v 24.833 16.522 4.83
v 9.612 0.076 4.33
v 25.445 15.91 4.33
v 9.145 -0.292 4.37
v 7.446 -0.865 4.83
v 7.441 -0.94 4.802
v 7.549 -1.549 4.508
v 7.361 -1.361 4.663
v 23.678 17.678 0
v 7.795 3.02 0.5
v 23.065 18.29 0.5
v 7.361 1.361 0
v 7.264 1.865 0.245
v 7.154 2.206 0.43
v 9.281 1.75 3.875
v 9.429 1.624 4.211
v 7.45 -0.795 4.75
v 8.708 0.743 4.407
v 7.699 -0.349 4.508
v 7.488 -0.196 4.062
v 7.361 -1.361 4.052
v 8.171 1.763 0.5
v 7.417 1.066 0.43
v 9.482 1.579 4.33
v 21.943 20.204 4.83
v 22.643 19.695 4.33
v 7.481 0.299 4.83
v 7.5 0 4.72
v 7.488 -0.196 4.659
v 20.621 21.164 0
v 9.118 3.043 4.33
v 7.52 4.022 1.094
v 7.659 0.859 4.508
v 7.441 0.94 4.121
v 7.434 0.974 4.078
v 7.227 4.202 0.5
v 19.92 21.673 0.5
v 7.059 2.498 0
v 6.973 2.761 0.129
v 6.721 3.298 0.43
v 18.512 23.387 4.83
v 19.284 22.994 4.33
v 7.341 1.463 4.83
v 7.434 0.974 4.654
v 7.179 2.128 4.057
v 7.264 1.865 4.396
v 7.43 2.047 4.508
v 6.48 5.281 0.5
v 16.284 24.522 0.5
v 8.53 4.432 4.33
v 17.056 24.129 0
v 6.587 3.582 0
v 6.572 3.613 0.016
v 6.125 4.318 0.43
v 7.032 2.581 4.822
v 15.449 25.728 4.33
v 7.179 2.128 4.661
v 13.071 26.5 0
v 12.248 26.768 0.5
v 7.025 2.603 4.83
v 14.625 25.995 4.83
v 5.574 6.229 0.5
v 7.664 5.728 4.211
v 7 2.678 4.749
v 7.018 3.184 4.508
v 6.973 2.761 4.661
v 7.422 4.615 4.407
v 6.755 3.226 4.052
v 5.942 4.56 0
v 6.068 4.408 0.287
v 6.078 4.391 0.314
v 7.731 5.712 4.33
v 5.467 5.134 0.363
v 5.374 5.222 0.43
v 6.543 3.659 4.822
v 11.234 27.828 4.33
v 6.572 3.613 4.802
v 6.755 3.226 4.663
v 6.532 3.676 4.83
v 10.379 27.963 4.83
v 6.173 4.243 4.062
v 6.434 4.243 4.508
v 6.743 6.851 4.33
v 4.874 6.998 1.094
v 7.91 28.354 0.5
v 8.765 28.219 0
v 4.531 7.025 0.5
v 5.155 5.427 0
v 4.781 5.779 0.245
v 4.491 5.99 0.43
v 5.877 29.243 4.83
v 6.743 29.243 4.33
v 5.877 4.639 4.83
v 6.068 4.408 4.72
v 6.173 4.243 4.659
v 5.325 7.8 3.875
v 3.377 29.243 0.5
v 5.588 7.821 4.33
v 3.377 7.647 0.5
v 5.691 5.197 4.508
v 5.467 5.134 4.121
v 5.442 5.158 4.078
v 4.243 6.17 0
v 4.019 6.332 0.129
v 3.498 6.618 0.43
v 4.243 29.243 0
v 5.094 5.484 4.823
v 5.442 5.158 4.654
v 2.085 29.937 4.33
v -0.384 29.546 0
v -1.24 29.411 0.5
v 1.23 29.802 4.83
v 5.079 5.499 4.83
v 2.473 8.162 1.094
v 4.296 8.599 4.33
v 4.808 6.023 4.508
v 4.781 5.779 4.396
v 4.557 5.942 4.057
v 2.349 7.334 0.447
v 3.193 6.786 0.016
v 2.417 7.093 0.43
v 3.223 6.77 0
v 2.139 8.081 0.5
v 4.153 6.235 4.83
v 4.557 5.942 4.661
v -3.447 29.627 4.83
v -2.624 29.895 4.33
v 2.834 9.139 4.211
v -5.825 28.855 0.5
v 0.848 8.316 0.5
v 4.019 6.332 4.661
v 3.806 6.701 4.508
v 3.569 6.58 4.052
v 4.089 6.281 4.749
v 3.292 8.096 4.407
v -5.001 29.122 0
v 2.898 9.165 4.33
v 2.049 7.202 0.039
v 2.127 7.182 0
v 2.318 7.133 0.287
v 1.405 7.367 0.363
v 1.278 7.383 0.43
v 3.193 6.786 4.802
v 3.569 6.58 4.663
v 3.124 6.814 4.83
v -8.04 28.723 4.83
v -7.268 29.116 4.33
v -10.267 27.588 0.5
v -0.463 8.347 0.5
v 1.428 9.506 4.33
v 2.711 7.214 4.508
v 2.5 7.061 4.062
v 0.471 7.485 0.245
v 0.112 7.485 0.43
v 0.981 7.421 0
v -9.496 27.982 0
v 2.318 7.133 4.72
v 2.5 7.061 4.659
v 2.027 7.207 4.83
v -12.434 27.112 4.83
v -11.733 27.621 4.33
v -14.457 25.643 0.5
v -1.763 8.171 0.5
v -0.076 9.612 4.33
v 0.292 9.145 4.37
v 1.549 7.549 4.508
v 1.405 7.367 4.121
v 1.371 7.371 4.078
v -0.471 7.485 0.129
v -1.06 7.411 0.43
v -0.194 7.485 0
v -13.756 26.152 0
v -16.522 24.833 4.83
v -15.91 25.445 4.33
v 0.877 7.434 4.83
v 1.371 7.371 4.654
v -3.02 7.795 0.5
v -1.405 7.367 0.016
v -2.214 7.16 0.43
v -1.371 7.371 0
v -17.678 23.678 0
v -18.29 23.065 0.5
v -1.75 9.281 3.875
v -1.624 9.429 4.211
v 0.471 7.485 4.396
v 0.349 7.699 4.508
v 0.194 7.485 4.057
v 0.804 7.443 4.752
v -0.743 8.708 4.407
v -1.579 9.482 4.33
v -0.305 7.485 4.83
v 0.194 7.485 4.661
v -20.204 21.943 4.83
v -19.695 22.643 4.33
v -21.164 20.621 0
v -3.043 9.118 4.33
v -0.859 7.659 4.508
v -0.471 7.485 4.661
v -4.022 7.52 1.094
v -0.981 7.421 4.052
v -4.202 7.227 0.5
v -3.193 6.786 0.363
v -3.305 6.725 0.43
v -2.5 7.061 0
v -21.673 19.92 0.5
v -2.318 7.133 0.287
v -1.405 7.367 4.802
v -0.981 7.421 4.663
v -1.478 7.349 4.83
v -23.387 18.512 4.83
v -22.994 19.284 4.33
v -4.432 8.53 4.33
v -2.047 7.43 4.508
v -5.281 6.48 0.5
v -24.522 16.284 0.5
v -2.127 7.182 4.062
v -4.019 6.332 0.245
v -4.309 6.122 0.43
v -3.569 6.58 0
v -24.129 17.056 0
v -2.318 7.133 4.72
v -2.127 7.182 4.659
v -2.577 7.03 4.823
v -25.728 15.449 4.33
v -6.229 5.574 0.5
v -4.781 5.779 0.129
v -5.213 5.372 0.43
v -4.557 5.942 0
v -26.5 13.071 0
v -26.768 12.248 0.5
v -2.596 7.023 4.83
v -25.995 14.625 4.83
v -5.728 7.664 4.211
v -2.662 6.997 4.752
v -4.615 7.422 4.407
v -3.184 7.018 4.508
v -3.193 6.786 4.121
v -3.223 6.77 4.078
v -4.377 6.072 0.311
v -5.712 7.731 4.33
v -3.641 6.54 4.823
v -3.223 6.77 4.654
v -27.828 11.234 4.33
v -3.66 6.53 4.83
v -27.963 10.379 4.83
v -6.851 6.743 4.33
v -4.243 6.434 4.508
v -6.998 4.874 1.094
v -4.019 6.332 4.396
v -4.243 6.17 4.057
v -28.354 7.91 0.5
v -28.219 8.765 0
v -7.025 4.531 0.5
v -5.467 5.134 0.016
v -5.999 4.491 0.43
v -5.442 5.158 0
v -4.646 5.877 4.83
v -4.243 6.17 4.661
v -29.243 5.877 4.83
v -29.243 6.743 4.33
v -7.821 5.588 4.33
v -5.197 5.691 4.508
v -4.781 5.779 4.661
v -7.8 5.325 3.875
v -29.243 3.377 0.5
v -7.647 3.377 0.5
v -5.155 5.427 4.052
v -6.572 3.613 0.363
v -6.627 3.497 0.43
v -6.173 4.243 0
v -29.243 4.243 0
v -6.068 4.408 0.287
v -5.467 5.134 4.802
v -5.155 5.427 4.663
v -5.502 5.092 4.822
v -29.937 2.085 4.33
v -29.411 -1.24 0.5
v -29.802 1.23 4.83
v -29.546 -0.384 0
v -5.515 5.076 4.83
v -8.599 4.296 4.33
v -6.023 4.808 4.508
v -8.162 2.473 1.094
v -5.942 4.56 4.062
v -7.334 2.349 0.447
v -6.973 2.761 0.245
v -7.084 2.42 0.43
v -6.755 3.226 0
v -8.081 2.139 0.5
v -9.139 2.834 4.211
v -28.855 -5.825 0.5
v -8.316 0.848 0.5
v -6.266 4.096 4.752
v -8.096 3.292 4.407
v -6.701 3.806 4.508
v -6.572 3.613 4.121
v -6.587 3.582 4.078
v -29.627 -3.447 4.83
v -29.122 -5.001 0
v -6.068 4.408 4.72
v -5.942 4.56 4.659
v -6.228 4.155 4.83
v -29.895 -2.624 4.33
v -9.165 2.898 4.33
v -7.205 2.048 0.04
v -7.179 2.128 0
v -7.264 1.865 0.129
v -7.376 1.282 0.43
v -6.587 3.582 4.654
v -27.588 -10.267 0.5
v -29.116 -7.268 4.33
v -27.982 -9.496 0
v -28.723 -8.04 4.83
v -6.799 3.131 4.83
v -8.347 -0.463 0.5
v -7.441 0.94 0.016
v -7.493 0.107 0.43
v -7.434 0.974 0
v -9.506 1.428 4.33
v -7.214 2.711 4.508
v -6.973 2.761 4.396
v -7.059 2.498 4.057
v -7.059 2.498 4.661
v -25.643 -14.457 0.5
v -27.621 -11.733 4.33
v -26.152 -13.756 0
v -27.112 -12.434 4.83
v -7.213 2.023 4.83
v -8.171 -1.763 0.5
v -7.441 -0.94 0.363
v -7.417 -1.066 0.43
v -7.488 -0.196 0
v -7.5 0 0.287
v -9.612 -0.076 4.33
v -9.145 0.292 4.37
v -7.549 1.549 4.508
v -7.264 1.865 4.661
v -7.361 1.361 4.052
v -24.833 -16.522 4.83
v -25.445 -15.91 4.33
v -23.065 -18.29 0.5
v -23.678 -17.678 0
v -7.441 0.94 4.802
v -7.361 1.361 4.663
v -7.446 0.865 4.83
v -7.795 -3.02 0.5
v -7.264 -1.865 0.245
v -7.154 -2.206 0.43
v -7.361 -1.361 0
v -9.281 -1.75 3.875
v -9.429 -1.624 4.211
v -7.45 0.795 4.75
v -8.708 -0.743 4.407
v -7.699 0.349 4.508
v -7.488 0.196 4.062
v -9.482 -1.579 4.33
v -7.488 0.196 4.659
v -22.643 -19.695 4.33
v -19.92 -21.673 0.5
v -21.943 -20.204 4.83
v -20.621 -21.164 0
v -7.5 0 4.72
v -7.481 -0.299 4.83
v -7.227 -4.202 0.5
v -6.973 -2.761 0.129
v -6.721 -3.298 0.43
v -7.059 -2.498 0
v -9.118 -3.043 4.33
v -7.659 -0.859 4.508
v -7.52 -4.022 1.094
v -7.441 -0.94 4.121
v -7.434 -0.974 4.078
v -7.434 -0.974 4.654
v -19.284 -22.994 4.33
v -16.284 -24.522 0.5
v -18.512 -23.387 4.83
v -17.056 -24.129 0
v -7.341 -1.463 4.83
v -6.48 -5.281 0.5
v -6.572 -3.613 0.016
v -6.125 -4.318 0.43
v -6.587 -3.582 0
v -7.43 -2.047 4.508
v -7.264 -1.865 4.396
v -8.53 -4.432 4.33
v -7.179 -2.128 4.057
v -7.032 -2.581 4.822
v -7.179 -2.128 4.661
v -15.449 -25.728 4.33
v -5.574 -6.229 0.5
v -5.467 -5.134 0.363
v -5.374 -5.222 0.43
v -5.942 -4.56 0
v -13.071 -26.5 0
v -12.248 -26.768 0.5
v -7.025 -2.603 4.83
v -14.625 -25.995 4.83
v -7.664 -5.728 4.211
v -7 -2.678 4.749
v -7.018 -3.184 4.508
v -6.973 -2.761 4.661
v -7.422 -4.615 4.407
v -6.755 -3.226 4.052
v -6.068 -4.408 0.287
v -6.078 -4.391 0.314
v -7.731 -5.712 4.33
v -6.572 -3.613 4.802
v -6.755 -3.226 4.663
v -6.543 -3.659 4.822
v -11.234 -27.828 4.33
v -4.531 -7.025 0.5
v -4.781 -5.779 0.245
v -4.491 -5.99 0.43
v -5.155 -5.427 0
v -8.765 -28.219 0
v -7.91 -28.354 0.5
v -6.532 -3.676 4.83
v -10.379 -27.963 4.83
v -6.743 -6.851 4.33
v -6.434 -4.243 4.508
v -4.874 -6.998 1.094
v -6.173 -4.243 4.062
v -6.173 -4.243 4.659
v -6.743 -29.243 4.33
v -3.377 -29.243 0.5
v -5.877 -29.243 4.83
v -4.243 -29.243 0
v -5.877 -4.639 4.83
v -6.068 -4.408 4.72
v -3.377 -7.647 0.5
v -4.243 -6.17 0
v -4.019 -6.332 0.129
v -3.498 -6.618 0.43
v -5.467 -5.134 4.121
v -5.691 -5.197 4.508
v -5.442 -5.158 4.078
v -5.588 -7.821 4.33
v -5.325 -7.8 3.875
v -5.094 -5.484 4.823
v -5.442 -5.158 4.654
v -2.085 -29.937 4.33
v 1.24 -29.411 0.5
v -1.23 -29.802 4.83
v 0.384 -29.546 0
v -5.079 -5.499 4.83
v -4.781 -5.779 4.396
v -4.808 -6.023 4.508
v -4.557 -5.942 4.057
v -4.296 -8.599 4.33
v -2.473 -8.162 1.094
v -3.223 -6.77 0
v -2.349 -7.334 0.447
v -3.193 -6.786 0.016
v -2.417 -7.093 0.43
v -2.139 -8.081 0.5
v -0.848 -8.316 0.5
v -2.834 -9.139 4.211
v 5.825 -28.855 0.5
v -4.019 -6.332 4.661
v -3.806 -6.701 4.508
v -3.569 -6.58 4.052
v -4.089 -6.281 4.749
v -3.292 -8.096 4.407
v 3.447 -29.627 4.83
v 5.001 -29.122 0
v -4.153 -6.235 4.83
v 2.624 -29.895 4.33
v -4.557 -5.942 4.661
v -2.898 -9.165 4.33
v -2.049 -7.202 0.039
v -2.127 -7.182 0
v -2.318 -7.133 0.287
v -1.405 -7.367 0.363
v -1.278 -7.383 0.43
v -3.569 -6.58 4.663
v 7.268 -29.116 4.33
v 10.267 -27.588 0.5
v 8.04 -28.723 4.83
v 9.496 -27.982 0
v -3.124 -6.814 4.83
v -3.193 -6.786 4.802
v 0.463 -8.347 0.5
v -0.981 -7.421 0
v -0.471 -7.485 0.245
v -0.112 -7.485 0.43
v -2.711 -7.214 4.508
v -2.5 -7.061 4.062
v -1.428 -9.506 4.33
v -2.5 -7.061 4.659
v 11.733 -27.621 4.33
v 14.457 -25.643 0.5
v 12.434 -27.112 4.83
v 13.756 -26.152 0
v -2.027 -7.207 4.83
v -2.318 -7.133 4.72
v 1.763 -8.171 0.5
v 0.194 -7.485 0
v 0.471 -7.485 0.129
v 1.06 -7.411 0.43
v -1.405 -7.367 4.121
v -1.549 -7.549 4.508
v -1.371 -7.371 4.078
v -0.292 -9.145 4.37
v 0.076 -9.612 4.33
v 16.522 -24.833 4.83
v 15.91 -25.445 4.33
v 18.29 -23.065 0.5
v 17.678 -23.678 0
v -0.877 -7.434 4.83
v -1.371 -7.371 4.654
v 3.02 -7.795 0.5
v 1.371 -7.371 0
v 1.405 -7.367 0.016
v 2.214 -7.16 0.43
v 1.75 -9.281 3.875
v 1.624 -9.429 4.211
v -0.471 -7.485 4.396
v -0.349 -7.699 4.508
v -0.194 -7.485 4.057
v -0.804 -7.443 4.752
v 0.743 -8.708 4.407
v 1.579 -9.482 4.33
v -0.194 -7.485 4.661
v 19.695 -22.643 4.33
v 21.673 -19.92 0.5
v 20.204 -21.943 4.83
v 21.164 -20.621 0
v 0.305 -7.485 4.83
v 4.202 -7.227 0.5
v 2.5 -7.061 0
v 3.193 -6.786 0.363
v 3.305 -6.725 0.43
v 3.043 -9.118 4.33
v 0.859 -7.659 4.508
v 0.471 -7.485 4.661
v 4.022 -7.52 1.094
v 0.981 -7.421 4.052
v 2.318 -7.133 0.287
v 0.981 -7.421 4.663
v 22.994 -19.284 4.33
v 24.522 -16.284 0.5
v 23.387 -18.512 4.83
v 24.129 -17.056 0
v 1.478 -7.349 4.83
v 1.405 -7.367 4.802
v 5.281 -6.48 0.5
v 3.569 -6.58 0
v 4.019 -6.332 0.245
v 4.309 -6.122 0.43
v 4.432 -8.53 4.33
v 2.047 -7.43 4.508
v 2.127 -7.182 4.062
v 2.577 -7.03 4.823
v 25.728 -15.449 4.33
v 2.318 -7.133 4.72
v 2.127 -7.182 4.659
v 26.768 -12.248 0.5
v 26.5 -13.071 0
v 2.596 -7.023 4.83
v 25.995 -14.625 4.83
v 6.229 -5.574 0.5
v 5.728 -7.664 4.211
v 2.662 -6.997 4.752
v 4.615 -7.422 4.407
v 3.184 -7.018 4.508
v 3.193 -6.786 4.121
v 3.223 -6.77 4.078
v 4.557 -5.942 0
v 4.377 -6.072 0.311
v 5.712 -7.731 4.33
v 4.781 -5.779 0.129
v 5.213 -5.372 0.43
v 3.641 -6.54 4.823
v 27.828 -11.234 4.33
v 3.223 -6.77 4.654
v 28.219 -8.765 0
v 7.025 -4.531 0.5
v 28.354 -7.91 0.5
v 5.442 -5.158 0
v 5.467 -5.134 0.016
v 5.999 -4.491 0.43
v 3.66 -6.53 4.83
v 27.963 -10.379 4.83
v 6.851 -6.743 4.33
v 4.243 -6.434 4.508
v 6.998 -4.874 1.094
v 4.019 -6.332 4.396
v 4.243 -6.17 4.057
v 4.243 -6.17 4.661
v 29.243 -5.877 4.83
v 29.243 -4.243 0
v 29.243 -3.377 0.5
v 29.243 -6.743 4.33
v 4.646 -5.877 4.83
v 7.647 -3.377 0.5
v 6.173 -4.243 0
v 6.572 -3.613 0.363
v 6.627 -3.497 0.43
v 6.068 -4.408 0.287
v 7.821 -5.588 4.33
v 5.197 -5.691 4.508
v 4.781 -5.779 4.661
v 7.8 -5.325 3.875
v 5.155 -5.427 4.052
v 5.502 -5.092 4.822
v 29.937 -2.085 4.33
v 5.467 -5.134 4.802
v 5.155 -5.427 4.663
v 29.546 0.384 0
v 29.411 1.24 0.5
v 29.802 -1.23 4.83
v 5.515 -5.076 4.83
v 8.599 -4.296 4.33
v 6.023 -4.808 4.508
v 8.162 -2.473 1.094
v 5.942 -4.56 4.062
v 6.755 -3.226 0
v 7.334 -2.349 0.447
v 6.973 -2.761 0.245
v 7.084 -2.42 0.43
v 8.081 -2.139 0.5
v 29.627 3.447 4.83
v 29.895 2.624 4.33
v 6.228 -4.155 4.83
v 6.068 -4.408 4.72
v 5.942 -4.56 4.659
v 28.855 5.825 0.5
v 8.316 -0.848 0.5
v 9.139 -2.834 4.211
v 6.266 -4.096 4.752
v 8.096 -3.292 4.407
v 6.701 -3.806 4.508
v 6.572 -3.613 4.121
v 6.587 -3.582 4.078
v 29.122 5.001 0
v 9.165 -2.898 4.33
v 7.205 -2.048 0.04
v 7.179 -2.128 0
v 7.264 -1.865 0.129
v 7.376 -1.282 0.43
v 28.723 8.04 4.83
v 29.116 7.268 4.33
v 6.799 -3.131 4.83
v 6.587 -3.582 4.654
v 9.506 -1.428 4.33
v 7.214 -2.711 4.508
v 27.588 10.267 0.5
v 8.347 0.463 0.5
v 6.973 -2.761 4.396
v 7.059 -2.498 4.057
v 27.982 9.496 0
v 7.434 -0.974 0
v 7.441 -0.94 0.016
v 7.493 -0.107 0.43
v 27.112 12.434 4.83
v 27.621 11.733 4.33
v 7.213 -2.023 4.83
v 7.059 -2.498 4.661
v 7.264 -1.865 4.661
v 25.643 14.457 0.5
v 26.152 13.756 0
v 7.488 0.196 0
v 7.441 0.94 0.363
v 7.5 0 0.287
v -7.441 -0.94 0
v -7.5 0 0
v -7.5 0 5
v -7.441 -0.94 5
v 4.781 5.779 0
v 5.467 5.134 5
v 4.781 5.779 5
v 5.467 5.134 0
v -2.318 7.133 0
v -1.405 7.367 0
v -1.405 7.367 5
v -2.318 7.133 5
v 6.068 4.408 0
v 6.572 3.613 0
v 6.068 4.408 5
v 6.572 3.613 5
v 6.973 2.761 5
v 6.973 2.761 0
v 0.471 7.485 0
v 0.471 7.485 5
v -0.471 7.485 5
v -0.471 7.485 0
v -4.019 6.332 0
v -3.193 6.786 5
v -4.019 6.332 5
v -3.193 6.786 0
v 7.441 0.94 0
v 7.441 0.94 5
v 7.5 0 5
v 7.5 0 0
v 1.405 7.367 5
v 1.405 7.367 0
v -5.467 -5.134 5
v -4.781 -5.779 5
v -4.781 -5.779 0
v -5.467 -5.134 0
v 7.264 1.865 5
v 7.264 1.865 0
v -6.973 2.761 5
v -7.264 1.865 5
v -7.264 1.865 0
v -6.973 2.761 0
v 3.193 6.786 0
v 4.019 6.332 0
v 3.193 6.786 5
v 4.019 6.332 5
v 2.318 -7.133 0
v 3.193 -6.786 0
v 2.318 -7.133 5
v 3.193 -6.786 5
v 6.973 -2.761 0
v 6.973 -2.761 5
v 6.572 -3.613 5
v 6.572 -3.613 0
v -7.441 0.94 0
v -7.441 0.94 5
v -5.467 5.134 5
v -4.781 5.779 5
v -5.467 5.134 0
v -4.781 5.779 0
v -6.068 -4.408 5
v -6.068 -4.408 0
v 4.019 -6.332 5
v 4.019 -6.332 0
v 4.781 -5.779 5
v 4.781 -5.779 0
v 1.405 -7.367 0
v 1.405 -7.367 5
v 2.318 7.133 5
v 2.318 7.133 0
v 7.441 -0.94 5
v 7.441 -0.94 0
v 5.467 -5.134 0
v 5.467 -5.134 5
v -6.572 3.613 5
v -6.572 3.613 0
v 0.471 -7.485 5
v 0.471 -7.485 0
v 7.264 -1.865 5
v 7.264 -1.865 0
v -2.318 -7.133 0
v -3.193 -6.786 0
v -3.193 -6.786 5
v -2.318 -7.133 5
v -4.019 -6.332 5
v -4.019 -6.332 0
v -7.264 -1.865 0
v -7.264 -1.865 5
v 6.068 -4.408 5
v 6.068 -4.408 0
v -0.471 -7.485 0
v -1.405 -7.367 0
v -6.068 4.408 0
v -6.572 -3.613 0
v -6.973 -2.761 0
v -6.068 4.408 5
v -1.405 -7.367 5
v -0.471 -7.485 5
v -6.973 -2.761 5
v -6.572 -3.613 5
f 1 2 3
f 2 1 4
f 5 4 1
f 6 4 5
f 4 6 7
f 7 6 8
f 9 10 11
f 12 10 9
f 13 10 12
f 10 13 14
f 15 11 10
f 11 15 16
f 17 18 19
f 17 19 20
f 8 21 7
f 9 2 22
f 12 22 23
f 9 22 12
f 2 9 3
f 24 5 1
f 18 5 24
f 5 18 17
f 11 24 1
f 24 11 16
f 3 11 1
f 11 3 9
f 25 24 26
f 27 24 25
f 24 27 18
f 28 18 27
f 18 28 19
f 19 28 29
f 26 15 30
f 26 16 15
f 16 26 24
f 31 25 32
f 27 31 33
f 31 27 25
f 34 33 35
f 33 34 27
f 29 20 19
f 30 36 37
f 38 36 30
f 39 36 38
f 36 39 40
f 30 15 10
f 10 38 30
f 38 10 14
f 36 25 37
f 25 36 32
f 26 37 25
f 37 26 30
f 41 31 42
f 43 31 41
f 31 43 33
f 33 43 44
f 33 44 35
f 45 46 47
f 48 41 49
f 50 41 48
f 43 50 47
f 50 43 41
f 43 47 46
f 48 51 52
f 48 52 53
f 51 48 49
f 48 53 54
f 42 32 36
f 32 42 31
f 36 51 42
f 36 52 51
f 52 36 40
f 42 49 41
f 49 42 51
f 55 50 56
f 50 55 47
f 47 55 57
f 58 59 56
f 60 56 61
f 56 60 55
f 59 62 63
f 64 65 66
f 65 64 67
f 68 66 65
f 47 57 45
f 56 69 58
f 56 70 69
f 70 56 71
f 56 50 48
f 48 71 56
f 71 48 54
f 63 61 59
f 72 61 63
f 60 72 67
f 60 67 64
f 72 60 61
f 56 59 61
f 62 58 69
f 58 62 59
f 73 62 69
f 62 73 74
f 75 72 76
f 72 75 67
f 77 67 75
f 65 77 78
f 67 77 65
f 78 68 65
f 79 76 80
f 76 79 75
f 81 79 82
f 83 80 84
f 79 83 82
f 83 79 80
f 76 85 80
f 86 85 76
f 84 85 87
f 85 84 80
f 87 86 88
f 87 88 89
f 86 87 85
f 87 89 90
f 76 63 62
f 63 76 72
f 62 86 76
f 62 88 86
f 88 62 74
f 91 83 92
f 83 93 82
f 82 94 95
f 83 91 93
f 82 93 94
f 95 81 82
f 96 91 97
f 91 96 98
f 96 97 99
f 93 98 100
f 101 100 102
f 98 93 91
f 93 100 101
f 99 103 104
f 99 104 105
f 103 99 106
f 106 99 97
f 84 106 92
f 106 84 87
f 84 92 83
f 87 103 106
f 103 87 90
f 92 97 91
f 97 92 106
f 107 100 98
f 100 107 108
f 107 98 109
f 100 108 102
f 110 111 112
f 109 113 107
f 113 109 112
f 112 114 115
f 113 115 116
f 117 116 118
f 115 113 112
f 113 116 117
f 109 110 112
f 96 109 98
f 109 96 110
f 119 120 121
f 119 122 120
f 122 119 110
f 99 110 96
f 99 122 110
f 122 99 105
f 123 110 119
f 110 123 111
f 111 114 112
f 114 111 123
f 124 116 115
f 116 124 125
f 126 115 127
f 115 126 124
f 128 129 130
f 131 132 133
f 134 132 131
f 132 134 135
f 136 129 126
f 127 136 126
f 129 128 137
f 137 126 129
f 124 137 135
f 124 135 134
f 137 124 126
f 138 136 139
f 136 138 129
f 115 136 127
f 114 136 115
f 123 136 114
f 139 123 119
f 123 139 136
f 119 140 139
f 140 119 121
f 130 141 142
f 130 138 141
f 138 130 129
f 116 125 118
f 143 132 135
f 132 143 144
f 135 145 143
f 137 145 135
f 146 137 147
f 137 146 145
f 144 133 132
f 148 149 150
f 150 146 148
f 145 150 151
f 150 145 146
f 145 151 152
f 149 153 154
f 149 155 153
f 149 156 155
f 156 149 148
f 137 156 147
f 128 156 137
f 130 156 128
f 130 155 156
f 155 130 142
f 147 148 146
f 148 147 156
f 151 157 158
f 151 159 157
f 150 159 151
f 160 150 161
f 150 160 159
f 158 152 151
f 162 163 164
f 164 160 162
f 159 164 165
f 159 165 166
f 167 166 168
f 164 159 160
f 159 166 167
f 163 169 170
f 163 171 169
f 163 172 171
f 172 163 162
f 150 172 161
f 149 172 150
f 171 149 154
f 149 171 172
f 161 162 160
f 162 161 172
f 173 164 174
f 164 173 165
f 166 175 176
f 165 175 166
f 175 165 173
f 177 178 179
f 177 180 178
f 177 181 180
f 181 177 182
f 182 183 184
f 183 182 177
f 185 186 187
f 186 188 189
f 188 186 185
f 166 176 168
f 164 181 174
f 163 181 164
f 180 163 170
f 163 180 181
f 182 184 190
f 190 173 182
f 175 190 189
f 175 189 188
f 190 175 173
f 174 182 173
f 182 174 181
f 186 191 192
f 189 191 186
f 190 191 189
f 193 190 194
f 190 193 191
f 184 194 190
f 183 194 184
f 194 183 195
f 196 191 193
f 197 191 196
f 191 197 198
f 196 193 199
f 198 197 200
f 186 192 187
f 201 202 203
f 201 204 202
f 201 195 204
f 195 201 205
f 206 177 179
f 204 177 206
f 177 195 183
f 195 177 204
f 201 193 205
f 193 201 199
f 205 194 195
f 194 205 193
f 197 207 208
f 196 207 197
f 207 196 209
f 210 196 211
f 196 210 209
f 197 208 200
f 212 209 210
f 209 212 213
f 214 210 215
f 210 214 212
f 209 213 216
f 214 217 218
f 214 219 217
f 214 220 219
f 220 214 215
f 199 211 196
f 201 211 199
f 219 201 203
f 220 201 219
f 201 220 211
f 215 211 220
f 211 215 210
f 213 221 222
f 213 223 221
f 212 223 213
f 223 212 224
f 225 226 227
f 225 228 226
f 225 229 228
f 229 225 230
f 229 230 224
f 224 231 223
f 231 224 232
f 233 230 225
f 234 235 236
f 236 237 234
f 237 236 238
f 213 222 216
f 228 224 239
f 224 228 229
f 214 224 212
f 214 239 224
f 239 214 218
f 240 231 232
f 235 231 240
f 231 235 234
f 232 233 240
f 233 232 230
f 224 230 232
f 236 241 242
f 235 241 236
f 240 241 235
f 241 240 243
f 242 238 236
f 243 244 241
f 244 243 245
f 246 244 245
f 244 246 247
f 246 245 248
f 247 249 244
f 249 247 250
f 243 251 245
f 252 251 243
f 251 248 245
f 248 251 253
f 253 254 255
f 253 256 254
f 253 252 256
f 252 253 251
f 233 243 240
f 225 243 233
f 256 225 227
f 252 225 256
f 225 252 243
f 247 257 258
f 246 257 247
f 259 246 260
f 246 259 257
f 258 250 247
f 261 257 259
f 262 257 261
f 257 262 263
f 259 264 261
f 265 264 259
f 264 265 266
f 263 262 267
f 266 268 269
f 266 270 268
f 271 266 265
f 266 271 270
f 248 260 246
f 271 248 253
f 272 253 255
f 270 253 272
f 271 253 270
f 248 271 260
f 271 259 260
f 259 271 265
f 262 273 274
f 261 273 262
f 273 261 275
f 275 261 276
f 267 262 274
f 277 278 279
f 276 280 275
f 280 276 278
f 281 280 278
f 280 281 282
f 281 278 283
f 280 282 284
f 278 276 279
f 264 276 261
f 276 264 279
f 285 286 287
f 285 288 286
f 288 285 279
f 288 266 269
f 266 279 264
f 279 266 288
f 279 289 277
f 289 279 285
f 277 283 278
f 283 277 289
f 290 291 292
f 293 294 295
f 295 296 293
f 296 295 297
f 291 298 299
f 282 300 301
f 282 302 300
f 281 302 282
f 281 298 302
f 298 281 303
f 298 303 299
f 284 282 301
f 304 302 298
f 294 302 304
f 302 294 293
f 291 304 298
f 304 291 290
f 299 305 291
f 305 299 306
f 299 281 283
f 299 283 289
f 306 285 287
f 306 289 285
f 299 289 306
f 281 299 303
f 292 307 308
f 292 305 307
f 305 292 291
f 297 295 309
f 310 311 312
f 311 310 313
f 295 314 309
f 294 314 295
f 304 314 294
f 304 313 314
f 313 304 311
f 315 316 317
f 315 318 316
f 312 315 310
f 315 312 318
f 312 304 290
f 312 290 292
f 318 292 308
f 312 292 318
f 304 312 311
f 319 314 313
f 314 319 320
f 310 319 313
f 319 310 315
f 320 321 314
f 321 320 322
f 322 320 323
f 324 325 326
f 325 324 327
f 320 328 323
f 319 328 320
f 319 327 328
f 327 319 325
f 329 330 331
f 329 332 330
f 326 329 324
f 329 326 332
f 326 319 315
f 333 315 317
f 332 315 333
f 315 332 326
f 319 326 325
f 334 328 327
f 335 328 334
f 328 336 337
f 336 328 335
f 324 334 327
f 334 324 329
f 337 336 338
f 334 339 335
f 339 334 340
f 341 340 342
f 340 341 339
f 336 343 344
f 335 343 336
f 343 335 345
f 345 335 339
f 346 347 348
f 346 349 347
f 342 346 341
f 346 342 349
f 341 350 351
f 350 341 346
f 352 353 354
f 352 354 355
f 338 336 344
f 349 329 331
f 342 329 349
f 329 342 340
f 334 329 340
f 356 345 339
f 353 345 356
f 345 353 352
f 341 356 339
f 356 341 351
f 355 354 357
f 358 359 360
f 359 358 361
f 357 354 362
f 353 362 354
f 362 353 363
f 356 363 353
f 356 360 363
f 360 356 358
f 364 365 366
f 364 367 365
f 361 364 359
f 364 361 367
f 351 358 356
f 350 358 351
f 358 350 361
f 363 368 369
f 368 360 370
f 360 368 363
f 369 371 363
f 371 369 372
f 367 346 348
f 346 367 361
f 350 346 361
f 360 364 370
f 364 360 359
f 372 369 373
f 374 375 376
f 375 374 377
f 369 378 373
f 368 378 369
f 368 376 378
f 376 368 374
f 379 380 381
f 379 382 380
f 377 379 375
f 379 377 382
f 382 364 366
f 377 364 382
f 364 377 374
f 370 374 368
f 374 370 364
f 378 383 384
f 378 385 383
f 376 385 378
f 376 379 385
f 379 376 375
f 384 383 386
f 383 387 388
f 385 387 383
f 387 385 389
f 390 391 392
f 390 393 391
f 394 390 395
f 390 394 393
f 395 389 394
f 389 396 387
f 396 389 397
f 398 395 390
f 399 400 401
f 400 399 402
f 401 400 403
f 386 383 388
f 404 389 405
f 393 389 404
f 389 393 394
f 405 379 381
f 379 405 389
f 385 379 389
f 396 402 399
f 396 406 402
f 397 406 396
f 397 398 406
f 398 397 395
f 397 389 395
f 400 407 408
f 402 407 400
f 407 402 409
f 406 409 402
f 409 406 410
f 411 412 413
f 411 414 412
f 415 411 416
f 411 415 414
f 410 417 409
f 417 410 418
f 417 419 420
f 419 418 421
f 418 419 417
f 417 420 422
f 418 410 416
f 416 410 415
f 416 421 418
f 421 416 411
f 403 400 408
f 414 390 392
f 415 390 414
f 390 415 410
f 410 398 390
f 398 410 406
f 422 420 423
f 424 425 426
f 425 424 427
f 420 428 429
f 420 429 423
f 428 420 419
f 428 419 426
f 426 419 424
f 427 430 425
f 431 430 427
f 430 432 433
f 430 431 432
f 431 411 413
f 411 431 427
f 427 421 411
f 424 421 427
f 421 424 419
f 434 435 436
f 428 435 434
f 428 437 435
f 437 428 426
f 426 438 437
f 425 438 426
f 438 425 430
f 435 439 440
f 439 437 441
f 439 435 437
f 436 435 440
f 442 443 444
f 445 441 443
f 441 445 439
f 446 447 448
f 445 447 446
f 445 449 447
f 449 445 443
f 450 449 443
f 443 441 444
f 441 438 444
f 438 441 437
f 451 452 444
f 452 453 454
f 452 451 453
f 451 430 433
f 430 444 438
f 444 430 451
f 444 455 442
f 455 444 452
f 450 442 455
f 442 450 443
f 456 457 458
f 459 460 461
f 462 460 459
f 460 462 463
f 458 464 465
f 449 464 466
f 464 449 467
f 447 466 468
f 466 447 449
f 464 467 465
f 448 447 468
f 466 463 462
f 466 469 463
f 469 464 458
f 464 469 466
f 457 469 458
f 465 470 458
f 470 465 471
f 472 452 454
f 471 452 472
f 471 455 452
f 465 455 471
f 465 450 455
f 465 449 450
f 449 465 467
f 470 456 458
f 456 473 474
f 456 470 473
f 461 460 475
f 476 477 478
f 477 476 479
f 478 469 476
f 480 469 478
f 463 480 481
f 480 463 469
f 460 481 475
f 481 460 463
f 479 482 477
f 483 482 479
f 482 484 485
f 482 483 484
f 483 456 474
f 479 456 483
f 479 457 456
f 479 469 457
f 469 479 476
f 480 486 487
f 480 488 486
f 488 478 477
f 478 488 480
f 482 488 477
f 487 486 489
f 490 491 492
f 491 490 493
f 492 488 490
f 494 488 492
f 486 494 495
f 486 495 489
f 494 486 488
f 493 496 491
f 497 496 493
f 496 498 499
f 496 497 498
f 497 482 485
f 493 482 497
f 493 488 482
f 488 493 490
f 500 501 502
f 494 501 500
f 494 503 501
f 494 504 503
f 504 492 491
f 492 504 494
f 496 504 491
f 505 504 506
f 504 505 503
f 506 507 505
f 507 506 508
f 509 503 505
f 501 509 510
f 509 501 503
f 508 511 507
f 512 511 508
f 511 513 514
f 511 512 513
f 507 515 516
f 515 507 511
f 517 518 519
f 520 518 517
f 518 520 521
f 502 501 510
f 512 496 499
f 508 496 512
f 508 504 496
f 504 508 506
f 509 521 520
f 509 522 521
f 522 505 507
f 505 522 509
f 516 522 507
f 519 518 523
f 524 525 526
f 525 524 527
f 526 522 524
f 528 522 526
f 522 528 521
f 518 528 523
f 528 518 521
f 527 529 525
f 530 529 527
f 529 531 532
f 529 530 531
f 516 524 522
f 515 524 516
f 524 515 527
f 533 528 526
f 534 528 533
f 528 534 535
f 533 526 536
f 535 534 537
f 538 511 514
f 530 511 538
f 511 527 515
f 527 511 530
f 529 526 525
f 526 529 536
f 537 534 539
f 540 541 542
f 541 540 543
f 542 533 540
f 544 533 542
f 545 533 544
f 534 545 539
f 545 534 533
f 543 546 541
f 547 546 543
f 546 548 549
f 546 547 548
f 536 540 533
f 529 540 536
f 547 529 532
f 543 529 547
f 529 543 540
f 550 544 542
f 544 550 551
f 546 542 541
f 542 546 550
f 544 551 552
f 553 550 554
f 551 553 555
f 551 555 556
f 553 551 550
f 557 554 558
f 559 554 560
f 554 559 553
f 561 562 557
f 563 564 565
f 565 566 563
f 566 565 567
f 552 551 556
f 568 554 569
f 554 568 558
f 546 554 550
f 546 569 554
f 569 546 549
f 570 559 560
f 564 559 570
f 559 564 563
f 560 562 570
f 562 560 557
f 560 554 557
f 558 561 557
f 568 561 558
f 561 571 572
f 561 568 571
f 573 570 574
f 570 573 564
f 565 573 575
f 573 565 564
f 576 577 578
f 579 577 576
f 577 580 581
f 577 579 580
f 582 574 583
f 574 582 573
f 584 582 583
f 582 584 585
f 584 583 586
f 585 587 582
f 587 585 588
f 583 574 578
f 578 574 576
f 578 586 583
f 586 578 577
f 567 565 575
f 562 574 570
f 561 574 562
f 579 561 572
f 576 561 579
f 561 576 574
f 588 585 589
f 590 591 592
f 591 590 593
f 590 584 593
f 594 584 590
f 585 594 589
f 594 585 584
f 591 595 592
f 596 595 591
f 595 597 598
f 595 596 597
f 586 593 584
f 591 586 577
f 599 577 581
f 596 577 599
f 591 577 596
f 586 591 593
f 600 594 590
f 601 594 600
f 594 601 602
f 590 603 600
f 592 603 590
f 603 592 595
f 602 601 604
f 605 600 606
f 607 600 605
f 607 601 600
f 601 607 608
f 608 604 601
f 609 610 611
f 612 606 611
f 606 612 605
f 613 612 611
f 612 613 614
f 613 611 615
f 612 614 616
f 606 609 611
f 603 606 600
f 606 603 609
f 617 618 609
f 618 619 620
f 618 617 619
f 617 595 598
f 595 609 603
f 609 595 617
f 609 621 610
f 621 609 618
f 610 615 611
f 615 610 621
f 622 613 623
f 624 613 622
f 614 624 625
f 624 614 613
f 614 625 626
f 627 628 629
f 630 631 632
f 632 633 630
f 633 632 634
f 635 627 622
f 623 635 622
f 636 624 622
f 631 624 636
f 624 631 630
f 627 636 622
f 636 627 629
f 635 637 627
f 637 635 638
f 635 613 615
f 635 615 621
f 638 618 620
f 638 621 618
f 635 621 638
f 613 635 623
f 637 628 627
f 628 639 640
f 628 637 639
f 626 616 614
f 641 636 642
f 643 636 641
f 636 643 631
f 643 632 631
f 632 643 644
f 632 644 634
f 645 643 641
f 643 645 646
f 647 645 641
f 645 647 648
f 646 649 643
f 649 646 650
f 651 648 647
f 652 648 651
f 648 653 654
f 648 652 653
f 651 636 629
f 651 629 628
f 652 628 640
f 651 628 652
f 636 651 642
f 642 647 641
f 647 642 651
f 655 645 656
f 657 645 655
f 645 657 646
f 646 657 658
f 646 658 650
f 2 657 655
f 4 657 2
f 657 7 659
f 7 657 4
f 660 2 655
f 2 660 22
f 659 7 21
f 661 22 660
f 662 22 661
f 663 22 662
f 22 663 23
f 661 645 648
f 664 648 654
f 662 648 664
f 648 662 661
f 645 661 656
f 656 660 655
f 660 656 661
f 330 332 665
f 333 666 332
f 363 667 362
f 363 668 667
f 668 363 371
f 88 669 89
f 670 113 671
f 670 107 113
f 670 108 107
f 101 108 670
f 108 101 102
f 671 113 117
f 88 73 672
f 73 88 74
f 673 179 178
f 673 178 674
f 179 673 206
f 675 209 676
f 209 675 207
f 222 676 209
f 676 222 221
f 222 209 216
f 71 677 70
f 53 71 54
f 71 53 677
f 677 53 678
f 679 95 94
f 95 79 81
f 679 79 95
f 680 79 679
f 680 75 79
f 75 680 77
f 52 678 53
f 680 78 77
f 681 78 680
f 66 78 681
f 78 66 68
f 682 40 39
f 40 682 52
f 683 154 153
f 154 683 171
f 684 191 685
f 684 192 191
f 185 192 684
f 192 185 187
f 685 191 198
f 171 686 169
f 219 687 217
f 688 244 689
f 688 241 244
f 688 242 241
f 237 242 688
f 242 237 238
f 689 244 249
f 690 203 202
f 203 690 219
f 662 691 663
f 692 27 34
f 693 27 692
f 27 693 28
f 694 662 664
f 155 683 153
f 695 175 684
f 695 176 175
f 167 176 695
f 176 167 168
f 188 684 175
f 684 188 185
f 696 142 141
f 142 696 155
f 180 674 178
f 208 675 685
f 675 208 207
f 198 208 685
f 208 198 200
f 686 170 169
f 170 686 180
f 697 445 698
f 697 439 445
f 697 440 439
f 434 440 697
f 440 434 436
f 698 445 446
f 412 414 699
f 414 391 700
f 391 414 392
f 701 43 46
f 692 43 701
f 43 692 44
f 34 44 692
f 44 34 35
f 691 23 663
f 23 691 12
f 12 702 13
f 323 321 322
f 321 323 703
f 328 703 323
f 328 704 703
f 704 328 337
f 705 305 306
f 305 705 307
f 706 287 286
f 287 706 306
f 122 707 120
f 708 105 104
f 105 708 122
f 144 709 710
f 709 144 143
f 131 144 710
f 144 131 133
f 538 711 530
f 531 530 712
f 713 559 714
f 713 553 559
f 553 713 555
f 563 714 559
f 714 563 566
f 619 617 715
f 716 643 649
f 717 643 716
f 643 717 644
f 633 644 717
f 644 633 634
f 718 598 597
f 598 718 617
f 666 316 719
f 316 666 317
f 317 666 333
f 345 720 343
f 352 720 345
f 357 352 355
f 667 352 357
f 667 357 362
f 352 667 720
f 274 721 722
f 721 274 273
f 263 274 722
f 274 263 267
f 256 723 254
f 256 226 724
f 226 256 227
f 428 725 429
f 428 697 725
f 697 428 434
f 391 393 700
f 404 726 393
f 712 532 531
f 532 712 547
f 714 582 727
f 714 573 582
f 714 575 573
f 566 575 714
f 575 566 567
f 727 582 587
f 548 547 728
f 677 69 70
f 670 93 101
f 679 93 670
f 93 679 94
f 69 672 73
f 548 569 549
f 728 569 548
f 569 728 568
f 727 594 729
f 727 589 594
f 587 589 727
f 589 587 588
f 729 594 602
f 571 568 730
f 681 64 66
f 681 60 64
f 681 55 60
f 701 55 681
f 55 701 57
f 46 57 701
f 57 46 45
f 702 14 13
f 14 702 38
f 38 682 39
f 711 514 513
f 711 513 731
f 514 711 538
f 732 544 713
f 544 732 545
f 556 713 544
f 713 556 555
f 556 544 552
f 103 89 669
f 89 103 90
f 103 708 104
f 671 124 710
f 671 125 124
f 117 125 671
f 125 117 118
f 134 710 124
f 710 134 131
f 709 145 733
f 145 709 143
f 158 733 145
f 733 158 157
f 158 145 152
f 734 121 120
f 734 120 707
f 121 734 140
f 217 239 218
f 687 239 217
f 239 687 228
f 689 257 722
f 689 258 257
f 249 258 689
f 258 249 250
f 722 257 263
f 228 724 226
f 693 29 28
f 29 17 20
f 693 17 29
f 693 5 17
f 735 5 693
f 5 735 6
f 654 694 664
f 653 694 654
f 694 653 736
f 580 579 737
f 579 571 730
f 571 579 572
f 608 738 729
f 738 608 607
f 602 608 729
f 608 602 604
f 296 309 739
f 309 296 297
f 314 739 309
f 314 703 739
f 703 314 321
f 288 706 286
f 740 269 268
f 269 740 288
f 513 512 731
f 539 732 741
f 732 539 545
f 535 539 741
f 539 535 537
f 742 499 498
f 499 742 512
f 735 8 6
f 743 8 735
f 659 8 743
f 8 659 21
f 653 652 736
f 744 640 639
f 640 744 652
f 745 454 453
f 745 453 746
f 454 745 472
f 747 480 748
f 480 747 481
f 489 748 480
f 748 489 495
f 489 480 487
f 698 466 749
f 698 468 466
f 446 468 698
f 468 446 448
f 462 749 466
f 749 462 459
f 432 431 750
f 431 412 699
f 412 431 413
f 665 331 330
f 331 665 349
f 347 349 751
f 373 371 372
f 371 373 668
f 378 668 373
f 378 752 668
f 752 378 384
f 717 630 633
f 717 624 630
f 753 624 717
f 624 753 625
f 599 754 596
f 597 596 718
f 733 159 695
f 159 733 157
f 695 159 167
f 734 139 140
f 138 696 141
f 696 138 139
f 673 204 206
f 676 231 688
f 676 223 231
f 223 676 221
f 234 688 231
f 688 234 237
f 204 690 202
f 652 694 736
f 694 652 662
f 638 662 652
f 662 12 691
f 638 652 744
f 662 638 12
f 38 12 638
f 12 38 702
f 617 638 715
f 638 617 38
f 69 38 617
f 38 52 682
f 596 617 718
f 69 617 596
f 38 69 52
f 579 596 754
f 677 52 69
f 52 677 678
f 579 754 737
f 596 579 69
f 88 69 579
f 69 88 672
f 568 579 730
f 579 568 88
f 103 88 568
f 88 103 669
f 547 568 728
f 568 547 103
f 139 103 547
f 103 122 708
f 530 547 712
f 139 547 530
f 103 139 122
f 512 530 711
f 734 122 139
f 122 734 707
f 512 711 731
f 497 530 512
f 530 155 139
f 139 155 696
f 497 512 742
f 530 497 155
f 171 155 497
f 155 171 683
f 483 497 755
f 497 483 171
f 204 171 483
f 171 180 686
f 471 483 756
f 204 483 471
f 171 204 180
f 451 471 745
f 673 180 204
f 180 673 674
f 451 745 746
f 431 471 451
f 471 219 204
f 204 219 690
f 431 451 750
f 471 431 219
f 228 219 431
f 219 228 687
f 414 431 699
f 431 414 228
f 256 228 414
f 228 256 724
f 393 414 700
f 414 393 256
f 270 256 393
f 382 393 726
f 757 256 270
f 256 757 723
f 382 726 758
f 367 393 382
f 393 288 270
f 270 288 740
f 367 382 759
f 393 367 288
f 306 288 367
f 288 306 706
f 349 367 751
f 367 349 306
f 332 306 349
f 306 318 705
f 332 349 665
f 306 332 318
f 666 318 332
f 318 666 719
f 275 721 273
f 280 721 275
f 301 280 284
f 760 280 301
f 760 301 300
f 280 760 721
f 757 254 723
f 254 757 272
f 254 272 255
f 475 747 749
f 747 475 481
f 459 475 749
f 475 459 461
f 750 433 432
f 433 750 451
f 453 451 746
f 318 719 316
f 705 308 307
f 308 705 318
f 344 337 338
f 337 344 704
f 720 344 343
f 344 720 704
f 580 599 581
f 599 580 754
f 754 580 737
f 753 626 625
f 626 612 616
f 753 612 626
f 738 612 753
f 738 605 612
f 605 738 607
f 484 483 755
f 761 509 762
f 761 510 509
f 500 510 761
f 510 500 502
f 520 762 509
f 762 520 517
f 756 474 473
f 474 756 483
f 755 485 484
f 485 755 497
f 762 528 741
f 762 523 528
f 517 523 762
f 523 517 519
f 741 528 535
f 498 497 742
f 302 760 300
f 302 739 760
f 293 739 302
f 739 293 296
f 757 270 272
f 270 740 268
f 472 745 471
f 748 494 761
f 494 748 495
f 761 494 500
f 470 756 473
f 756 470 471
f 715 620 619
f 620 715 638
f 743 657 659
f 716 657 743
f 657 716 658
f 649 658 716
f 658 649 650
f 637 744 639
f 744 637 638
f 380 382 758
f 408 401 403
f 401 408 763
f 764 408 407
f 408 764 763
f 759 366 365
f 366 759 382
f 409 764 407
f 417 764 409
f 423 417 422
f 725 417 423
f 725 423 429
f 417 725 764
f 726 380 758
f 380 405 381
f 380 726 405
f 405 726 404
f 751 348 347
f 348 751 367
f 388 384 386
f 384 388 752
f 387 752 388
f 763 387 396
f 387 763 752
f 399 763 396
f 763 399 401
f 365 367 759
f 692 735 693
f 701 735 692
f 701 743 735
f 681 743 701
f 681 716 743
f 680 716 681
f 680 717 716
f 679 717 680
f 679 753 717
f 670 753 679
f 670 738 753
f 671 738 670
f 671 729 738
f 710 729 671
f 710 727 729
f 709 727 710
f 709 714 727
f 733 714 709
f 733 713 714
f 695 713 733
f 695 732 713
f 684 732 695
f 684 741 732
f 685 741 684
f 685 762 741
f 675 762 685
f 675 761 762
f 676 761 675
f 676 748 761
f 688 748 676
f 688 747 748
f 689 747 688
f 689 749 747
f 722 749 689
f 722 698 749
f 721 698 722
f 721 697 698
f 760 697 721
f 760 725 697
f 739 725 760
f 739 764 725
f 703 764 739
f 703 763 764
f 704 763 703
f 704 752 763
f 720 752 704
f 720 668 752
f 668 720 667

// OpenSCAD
// Параметры винта кулера
outer_diameter = 50; // 5см в миллиметрах
inner_diameter = 15; // 1.5см в миллиметрах
height = 3; // высота винта
blade_count = 40; // количество лопастей
blade_thickness = 1; // толщина лопасти

// Внутреннее отверстие
cylinder(h=height+2, d=inner_diameter, $fn=50);
    
// Лопасти винта
for(i = [0:blade_count-1]) {
    rotate([0, 0, i * (360/blade_count)])
    translate([inner_diameter/2.5, 0, 0])
    rotate([30, 0, 45])
    cube([outer_diameter/2, blade_thickness, height+2]);
}
